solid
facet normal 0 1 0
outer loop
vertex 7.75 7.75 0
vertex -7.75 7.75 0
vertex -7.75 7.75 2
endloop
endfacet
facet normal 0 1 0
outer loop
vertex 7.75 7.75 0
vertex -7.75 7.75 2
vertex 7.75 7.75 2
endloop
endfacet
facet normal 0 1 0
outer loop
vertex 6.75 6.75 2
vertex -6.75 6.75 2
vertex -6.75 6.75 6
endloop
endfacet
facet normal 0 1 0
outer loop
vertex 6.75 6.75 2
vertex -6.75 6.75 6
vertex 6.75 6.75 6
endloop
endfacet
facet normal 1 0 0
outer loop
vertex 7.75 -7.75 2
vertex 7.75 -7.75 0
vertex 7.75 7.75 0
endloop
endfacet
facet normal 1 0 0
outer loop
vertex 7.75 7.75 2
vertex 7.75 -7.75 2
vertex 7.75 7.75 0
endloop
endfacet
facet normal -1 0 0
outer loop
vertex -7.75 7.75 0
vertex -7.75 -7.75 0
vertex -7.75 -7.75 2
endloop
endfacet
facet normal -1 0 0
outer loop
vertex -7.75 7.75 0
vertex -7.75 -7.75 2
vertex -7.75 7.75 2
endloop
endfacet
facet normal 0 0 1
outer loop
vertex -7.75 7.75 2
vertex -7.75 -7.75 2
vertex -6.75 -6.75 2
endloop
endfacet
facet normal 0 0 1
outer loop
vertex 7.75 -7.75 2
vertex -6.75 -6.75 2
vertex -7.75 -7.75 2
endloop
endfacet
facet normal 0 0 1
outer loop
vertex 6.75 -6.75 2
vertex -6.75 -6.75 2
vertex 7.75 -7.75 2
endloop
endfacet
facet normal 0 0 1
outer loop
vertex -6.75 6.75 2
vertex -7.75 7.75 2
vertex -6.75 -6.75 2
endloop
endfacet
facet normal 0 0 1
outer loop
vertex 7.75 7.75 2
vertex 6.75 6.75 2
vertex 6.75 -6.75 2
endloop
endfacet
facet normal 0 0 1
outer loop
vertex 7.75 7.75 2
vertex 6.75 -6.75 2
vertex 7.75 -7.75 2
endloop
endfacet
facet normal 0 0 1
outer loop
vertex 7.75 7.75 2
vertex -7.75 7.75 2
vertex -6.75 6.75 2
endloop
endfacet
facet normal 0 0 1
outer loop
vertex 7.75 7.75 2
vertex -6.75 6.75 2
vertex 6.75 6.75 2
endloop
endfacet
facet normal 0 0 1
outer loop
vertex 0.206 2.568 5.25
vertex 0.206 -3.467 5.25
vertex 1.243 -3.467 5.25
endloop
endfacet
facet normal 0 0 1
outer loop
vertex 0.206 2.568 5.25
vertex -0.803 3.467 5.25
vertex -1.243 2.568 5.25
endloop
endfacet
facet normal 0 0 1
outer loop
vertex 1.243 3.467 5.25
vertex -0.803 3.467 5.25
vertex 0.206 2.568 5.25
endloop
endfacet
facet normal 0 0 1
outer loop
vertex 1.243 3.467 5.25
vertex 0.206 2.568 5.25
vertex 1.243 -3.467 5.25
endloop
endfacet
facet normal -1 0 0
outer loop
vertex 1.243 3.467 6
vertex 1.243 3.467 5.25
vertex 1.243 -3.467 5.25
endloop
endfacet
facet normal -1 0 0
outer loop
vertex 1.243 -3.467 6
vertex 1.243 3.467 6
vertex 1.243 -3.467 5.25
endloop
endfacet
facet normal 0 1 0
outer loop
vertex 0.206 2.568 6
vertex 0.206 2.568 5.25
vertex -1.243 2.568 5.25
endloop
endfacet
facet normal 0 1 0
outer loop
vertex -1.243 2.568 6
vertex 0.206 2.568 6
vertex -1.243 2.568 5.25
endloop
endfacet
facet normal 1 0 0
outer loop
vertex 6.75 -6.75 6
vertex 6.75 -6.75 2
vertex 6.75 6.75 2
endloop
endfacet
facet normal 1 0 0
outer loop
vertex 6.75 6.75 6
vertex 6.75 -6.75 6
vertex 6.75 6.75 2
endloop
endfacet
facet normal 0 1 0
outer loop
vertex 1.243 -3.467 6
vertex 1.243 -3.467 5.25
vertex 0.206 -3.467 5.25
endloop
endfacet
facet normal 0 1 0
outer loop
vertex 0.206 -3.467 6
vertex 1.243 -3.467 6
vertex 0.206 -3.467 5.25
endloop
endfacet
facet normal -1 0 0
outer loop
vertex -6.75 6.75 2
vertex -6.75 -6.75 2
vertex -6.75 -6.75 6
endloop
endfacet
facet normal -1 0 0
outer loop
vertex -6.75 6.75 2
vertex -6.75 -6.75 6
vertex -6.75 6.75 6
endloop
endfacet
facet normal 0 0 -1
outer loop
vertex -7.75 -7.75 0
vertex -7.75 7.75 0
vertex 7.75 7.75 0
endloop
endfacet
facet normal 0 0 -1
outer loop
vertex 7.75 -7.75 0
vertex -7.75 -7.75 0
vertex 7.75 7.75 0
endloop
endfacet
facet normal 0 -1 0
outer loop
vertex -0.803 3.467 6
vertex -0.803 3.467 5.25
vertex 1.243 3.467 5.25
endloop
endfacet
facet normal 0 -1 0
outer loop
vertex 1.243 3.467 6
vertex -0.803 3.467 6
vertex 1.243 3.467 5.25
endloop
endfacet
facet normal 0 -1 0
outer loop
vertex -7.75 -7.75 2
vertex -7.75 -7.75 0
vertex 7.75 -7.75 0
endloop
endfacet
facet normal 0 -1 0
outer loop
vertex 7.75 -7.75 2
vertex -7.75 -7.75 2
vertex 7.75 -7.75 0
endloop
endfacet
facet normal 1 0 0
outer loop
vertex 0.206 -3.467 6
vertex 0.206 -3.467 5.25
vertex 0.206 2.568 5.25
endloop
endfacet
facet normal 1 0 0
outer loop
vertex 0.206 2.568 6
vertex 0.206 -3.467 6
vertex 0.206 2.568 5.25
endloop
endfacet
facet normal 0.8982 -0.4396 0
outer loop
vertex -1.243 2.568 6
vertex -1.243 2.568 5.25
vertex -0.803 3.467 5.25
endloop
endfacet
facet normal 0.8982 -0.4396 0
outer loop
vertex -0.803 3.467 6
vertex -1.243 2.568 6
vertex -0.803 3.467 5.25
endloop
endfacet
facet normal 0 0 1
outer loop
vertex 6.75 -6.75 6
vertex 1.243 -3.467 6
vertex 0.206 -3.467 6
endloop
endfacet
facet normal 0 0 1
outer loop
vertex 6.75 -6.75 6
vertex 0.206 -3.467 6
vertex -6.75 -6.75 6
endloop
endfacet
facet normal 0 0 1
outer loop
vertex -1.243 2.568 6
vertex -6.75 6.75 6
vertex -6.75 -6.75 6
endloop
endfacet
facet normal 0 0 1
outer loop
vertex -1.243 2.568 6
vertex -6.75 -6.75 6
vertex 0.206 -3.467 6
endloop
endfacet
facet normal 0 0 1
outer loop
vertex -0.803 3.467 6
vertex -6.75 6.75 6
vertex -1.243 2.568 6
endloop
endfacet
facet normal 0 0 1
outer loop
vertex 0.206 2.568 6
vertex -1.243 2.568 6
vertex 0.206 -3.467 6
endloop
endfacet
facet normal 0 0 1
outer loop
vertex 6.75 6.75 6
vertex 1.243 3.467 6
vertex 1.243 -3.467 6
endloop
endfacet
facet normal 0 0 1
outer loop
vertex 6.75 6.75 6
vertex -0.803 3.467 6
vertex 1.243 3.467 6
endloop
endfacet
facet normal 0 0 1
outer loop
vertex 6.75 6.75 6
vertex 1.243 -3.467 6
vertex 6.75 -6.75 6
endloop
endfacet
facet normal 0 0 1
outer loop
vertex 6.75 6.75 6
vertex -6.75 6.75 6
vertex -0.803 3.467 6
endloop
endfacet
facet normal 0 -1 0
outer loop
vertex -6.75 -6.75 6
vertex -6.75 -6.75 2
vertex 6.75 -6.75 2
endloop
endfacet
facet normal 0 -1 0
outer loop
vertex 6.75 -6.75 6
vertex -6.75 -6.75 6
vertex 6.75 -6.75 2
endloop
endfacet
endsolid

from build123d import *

# Parameters (mm, degrees)
F0_W     = 15.5
F0_H     = 15.5
F0_W_2   = 13.5
F0_H_2   = 13.5
F1_DEPTH = 2
F2_DEPTH = 6
F3_DEPTH = 5.25


with BuildPart() as f1:
    # F0 (on Top) → F1 (new body)
    with BuildSketch(Plane.XY):
        Rectangle(F0_W, F0_H)
        Rectangle(F0_W_2, F0_H_2, mode=Mode.SUBTRACT)
    extrude(amount=F1_DEPTH)

    # F0 (on Top) → F2 (join)
    with BuildSketch(Plane.XY):
        Rectangle(F0_W_2, F0_H_2)
        Polygon((1.24317, -3.46653), (0.205601, -3.46653), (0.205601, 2.567623), (-1.243169, 2.567623), (-0.803279, 3.46653), (1.24317, 3.46653), align=None, mode=Mode.SUBTRACT)
    extrude(amount=F2_DEPTH)

    # F0 (on Top) → F3 (join)
    with BuildSketch(Plane.XY):
        Polygon((0.205601, 2.567623), (0.205601, -3.46653), (1.24317, -3.46653), (1.24317, 3.46653), (-0.803279, 3.46653), (-1.243169, 2.567623), align=None)
    extrude(amount=F3_DEPTH)


solid = f1.part
